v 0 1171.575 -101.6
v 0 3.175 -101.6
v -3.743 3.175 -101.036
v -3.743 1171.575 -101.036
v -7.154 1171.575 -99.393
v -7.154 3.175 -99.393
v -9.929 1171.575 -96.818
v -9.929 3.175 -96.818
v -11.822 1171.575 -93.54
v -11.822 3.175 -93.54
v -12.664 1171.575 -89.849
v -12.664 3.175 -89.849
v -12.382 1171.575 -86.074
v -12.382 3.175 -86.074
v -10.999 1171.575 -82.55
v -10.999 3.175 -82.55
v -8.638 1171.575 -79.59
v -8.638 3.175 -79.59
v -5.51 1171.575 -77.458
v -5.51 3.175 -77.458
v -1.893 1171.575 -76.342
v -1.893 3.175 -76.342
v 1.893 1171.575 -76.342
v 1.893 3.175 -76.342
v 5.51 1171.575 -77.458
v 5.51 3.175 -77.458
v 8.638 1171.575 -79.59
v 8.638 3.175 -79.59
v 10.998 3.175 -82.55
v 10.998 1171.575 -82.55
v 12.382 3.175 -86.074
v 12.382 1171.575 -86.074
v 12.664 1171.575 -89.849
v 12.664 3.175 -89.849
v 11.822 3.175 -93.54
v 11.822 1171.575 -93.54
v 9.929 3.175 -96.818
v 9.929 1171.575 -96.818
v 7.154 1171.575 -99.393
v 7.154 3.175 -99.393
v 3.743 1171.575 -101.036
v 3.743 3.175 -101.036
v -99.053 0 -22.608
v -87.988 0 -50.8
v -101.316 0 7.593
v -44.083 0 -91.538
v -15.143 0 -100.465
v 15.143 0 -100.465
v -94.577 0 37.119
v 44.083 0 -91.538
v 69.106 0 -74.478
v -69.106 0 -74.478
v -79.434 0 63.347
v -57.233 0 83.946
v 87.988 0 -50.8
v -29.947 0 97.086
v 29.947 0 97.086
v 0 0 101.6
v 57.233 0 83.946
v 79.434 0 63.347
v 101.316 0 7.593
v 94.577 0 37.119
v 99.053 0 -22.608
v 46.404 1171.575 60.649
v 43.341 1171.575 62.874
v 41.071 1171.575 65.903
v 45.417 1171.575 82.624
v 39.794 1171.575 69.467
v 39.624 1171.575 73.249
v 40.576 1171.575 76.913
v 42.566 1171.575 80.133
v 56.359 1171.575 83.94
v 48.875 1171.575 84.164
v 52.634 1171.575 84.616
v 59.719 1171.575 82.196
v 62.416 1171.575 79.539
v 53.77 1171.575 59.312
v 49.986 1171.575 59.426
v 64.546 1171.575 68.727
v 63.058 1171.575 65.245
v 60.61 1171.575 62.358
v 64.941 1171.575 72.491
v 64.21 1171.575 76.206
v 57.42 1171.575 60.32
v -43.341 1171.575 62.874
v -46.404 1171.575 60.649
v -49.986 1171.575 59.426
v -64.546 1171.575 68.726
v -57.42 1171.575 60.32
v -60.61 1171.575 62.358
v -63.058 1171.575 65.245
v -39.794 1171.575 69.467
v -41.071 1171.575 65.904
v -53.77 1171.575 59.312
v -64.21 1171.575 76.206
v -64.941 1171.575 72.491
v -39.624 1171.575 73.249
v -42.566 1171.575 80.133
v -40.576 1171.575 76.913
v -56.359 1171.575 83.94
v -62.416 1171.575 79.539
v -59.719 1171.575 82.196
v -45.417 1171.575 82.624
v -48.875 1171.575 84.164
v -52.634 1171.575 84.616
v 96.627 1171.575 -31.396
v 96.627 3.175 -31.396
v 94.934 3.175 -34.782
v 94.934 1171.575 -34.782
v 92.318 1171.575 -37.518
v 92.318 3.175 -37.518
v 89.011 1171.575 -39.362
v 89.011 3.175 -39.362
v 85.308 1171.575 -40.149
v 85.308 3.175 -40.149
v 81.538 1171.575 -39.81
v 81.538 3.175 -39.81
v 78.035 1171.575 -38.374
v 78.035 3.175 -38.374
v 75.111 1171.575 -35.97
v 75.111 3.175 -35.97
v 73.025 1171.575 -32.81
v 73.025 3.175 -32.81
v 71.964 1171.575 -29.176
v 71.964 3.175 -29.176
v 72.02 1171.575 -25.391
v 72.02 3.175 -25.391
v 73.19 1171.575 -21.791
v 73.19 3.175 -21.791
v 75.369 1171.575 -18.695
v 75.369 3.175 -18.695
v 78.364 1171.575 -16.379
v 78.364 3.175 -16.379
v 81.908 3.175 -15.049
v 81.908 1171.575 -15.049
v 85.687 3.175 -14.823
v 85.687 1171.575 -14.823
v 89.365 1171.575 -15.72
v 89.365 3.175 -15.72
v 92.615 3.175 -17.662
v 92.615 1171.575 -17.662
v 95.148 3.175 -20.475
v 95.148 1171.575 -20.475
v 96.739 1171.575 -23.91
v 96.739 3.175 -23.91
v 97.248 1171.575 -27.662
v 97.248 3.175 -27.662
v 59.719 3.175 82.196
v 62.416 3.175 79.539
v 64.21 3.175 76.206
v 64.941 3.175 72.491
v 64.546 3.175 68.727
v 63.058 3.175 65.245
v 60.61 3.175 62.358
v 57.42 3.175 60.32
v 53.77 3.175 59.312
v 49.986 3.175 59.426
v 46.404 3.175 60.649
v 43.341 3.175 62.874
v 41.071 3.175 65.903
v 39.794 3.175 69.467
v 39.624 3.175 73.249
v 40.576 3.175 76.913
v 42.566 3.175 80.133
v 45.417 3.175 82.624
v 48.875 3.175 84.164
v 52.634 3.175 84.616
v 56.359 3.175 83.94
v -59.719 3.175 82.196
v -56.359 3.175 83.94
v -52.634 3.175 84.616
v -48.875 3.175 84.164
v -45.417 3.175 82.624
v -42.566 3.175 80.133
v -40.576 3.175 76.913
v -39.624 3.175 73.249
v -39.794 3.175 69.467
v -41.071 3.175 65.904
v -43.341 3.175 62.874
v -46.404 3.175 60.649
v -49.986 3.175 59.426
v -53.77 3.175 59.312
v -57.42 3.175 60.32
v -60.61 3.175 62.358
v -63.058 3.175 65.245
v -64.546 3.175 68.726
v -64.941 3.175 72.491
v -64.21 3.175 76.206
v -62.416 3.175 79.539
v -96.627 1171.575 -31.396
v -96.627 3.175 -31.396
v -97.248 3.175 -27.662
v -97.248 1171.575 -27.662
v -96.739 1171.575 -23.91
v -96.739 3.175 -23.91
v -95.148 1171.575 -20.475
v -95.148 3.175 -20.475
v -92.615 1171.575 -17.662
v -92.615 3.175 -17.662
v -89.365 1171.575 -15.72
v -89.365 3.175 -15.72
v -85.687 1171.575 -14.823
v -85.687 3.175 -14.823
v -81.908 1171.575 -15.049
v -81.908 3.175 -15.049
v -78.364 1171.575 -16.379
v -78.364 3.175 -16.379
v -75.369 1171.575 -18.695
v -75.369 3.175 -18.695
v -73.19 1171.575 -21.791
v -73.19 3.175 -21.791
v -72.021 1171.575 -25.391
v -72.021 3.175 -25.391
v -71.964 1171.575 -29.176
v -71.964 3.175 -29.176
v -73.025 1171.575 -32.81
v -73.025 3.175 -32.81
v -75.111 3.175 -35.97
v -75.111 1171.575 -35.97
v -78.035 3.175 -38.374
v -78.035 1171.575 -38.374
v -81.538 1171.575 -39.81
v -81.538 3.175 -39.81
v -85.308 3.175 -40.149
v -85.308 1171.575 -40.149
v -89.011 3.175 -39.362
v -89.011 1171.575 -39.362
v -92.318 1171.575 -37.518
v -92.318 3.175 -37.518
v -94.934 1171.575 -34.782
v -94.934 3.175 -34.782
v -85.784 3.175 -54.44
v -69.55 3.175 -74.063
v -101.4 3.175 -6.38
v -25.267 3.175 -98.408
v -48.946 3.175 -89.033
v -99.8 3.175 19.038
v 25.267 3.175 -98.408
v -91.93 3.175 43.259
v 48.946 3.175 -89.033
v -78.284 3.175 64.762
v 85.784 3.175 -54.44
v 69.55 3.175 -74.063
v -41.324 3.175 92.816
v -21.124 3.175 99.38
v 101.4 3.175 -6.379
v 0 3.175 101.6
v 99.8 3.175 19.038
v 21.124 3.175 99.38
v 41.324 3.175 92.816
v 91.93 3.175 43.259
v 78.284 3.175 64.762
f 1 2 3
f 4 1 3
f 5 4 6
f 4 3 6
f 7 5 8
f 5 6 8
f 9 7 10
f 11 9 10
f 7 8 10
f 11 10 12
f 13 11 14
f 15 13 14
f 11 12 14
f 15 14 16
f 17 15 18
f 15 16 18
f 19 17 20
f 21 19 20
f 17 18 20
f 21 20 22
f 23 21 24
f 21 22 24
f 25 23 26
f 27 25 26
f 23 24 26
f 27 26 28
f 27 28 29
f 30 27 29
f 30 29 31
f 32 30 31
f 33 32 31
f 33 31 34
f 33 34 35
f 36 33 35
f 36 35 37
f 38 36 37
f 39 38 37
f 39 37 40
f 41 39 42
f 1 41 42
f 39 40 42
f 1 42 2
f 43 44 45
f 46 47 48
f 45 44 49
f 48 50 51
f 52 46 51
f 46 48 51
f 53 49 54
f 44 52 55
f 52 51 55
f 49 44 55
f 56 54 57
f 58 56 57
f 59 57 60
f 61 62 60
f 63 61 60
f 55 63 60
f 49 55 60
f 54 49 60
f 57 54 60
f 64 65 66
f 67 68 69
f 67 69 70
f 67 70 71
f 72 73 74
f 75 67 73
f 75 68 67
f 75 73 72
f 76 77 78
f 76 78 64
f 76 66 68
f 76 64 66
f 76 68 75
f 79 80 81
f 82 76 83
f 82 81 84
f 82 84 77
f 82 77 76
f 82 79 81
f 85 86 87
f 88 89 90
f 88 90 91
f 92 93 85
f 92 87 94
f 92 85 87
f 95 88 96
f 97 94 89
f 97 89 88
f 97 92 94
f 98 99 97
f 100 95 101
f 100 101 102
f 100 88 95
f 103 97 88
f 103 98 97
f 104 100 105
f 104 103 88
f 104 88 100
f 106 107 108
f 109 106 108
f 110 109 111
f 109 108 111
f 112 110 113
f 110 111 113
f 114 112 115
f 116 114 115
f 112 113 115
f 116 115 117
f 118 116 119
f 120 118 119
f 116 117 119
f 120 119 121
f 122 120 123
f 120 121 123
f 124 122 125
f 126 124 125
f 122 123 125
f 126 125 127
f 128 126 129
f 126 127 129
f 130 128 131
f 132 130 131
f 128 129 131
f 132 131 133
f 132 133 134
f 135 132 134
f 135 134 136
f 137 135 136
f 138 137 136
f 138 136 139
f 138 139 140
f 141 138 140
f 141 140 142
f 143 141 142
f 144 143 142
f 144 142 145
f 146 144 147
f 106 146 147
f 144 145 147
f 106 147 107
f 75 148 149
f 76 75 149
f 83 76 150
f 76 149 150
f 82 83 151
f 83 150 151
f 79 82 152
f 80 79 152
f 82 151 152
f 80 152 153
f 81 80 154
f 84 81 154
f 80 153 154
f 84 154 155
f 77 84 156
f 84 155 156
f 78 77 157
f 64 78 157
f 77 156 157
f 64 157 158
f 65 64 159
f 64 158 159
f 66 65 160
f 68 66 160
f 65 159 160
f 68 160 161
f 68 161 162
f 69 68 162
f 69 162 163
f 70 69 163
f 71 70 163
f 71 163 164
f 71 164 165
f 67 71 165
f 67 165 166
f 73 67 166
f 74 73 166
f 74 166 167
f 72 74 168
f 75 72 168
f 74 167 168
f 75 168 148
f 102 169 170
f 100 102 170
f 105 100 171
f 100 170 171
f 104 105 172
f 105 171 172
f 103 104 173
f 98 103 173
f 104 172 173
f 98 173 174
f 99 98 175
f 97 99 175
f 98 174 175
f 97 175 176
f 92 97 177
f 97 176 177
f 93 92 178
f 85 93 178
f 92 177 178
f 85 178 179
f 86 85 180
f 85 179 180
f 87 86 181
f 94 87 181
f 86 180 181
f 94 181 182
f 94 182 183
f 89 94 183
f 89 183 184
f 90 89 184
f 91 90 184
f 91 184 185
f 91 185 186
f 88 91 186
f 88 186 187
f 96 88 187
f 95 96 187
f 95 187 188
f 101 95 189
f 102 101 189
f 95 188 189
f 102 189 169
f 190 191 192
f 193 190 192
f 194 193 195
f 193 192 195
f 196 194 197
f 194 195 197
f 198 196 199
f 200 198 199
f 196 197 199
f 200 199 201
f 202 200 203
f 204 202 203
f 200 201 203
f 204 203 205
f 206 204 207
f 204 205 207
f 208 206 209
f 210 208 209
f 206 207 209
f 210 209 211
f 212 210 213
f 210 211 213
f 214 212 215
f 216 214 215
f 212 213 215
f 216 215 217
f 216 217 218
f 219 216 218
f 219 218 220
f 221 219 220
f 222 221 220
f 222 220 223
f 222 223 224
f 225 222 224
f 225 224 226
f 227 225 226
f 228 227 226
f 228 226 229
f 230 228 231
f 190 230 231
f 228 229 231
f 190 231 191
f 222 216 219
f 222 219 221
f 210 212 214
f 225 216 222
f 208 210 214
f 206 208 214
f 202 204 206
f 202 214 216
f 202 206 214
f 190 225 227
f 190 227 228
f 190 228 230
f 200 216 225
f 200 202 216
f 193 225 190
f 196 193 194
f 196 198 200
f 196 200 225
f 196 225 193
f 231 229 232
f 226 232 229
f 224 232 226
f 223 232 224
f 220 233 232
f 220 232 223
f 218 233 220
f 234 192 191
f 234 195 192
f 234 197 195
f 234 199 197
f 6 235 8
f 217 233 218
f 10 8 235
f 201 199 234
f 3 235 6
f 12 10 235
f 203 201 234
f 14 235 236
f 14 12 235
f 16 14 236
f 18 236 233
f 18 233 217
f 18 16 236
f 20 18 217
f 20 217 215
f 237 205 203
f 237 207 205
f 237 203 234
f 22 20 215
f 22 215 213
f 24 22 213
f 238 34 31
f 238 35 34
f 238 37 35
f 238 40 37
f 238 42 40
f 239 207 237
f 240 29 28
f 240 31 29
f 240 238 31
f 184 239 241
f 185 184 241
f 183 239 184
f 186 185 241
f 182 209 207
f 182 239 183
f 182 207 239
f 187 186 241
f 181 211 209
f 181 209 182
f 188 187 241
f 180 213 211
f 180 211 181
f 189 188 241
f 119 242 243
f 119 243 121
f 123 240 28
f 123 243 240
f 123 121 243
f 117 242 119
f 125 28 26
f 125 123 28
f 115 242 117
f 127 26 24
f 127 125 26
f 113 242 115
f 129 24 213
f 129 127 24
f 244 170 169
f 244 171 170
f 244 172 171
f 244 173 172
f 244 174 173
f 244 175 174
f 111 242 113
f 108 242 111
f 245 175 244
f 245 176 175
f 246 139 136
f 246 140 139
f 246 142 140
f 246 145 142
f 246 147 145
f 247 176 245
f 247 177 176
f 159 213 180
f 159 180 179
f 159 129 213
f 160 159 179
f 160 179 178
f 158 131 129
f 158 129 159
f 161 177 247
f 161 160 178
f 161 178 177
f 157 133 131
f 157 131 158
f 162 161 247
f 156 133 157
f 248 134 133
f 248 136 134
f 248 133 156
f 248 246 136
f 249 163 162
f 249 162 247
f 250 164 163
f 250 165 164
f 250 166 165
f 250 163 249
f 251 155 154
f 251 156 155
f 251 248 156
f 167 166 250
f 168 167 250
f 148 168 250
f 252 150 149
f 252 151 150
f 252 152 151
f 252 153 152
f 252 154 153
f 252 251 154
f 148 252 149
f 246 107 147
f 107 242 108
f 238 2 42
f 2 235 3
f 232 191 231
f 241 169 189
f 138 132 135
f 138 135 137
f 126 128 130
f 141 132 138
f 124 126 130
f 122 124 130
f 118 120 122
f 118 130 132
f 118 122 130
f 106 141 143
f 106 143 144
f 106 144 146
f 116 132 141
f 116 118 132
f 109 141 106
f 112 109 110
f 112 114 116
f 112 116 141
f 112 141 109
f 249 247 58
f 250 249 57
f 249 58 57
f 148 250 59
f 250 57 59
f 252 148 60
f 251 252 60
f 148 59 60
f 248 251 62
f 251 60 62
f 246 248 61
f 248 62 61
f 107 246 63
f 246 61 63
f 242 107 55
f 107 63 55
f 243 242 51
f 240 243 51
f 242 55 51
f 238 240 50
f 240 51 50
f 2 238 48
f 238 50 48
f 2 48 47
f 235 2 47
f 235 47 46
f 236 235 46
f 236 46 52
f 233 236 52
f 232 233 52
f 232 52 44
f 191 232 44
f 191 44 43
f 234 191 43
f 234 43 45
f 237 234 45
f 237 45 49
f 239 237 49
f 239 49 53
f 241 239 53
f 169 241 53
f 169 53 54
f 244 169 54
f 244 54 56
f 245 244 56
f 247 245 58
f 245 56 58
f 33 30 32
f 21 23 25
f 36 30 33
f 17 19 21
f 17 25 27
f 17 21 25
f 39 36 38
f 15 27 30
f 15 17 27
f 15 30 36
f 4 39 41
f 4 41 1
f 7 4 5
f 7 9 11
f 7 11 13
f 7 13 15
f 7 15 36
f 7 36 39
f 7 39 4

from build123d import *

# Parameters (mm, degrees)
SKETCH5_R            = 101.6
BOSS_EXTRUDE9_DEPTH  = 3.175
SKETCH6_R            = 12.7
BOSS_EXTRUDE10_DEPTH = 1168.4


with BuildPart() as part:
    # Sketch5 → Boss-Extrude9 (new body)
    with BuildSketch(Plane(origin=(0, 0, 0), x_dir=(1, 0, 0), z_dir=(0, 1, 0))):
        with Locations(Location((0, 0, 0), (0, 0, 270))):
            Circle(SKETCH5_R)
    extrude(amount=BOSS_EXTRUDE9_DEPTH)

    # Sketch6 → Boss-Extrude10 (add)
    with BuildSketch(Plane(origin=(0, 3.175, 0), x_dir=(1, 0, 0), z_dir=(0, 1, 0))):
        with Locations(Location((0, 88.9, 0), (0, 0, 89.999756917))):
            Circle(SKETCH6_R)
        with Locations(Location((84.548924299, 27.4716108, 0), (0, 0, 17.999752599))):
            Circle(SKETCH6_R)
        with Locations(Location((52.254108929, -71.9216108, 0), (0, 0, 305.999749955))):
            Circle(SKETCH6_R)
        with Locations(Location((-52.254108929, -71.9216108, 0), (0, 0, 233.999752099))):
            Circle(SKETCH6_R)
        with Locations(Location((-84.548924299, 27.4716108, 0), (0, 0, 161.999755865))):
            Circle(SKETCH6_R)
    extrude(amount=BOSS_EXTRUDE10_DEPTH)


solid = part.part
